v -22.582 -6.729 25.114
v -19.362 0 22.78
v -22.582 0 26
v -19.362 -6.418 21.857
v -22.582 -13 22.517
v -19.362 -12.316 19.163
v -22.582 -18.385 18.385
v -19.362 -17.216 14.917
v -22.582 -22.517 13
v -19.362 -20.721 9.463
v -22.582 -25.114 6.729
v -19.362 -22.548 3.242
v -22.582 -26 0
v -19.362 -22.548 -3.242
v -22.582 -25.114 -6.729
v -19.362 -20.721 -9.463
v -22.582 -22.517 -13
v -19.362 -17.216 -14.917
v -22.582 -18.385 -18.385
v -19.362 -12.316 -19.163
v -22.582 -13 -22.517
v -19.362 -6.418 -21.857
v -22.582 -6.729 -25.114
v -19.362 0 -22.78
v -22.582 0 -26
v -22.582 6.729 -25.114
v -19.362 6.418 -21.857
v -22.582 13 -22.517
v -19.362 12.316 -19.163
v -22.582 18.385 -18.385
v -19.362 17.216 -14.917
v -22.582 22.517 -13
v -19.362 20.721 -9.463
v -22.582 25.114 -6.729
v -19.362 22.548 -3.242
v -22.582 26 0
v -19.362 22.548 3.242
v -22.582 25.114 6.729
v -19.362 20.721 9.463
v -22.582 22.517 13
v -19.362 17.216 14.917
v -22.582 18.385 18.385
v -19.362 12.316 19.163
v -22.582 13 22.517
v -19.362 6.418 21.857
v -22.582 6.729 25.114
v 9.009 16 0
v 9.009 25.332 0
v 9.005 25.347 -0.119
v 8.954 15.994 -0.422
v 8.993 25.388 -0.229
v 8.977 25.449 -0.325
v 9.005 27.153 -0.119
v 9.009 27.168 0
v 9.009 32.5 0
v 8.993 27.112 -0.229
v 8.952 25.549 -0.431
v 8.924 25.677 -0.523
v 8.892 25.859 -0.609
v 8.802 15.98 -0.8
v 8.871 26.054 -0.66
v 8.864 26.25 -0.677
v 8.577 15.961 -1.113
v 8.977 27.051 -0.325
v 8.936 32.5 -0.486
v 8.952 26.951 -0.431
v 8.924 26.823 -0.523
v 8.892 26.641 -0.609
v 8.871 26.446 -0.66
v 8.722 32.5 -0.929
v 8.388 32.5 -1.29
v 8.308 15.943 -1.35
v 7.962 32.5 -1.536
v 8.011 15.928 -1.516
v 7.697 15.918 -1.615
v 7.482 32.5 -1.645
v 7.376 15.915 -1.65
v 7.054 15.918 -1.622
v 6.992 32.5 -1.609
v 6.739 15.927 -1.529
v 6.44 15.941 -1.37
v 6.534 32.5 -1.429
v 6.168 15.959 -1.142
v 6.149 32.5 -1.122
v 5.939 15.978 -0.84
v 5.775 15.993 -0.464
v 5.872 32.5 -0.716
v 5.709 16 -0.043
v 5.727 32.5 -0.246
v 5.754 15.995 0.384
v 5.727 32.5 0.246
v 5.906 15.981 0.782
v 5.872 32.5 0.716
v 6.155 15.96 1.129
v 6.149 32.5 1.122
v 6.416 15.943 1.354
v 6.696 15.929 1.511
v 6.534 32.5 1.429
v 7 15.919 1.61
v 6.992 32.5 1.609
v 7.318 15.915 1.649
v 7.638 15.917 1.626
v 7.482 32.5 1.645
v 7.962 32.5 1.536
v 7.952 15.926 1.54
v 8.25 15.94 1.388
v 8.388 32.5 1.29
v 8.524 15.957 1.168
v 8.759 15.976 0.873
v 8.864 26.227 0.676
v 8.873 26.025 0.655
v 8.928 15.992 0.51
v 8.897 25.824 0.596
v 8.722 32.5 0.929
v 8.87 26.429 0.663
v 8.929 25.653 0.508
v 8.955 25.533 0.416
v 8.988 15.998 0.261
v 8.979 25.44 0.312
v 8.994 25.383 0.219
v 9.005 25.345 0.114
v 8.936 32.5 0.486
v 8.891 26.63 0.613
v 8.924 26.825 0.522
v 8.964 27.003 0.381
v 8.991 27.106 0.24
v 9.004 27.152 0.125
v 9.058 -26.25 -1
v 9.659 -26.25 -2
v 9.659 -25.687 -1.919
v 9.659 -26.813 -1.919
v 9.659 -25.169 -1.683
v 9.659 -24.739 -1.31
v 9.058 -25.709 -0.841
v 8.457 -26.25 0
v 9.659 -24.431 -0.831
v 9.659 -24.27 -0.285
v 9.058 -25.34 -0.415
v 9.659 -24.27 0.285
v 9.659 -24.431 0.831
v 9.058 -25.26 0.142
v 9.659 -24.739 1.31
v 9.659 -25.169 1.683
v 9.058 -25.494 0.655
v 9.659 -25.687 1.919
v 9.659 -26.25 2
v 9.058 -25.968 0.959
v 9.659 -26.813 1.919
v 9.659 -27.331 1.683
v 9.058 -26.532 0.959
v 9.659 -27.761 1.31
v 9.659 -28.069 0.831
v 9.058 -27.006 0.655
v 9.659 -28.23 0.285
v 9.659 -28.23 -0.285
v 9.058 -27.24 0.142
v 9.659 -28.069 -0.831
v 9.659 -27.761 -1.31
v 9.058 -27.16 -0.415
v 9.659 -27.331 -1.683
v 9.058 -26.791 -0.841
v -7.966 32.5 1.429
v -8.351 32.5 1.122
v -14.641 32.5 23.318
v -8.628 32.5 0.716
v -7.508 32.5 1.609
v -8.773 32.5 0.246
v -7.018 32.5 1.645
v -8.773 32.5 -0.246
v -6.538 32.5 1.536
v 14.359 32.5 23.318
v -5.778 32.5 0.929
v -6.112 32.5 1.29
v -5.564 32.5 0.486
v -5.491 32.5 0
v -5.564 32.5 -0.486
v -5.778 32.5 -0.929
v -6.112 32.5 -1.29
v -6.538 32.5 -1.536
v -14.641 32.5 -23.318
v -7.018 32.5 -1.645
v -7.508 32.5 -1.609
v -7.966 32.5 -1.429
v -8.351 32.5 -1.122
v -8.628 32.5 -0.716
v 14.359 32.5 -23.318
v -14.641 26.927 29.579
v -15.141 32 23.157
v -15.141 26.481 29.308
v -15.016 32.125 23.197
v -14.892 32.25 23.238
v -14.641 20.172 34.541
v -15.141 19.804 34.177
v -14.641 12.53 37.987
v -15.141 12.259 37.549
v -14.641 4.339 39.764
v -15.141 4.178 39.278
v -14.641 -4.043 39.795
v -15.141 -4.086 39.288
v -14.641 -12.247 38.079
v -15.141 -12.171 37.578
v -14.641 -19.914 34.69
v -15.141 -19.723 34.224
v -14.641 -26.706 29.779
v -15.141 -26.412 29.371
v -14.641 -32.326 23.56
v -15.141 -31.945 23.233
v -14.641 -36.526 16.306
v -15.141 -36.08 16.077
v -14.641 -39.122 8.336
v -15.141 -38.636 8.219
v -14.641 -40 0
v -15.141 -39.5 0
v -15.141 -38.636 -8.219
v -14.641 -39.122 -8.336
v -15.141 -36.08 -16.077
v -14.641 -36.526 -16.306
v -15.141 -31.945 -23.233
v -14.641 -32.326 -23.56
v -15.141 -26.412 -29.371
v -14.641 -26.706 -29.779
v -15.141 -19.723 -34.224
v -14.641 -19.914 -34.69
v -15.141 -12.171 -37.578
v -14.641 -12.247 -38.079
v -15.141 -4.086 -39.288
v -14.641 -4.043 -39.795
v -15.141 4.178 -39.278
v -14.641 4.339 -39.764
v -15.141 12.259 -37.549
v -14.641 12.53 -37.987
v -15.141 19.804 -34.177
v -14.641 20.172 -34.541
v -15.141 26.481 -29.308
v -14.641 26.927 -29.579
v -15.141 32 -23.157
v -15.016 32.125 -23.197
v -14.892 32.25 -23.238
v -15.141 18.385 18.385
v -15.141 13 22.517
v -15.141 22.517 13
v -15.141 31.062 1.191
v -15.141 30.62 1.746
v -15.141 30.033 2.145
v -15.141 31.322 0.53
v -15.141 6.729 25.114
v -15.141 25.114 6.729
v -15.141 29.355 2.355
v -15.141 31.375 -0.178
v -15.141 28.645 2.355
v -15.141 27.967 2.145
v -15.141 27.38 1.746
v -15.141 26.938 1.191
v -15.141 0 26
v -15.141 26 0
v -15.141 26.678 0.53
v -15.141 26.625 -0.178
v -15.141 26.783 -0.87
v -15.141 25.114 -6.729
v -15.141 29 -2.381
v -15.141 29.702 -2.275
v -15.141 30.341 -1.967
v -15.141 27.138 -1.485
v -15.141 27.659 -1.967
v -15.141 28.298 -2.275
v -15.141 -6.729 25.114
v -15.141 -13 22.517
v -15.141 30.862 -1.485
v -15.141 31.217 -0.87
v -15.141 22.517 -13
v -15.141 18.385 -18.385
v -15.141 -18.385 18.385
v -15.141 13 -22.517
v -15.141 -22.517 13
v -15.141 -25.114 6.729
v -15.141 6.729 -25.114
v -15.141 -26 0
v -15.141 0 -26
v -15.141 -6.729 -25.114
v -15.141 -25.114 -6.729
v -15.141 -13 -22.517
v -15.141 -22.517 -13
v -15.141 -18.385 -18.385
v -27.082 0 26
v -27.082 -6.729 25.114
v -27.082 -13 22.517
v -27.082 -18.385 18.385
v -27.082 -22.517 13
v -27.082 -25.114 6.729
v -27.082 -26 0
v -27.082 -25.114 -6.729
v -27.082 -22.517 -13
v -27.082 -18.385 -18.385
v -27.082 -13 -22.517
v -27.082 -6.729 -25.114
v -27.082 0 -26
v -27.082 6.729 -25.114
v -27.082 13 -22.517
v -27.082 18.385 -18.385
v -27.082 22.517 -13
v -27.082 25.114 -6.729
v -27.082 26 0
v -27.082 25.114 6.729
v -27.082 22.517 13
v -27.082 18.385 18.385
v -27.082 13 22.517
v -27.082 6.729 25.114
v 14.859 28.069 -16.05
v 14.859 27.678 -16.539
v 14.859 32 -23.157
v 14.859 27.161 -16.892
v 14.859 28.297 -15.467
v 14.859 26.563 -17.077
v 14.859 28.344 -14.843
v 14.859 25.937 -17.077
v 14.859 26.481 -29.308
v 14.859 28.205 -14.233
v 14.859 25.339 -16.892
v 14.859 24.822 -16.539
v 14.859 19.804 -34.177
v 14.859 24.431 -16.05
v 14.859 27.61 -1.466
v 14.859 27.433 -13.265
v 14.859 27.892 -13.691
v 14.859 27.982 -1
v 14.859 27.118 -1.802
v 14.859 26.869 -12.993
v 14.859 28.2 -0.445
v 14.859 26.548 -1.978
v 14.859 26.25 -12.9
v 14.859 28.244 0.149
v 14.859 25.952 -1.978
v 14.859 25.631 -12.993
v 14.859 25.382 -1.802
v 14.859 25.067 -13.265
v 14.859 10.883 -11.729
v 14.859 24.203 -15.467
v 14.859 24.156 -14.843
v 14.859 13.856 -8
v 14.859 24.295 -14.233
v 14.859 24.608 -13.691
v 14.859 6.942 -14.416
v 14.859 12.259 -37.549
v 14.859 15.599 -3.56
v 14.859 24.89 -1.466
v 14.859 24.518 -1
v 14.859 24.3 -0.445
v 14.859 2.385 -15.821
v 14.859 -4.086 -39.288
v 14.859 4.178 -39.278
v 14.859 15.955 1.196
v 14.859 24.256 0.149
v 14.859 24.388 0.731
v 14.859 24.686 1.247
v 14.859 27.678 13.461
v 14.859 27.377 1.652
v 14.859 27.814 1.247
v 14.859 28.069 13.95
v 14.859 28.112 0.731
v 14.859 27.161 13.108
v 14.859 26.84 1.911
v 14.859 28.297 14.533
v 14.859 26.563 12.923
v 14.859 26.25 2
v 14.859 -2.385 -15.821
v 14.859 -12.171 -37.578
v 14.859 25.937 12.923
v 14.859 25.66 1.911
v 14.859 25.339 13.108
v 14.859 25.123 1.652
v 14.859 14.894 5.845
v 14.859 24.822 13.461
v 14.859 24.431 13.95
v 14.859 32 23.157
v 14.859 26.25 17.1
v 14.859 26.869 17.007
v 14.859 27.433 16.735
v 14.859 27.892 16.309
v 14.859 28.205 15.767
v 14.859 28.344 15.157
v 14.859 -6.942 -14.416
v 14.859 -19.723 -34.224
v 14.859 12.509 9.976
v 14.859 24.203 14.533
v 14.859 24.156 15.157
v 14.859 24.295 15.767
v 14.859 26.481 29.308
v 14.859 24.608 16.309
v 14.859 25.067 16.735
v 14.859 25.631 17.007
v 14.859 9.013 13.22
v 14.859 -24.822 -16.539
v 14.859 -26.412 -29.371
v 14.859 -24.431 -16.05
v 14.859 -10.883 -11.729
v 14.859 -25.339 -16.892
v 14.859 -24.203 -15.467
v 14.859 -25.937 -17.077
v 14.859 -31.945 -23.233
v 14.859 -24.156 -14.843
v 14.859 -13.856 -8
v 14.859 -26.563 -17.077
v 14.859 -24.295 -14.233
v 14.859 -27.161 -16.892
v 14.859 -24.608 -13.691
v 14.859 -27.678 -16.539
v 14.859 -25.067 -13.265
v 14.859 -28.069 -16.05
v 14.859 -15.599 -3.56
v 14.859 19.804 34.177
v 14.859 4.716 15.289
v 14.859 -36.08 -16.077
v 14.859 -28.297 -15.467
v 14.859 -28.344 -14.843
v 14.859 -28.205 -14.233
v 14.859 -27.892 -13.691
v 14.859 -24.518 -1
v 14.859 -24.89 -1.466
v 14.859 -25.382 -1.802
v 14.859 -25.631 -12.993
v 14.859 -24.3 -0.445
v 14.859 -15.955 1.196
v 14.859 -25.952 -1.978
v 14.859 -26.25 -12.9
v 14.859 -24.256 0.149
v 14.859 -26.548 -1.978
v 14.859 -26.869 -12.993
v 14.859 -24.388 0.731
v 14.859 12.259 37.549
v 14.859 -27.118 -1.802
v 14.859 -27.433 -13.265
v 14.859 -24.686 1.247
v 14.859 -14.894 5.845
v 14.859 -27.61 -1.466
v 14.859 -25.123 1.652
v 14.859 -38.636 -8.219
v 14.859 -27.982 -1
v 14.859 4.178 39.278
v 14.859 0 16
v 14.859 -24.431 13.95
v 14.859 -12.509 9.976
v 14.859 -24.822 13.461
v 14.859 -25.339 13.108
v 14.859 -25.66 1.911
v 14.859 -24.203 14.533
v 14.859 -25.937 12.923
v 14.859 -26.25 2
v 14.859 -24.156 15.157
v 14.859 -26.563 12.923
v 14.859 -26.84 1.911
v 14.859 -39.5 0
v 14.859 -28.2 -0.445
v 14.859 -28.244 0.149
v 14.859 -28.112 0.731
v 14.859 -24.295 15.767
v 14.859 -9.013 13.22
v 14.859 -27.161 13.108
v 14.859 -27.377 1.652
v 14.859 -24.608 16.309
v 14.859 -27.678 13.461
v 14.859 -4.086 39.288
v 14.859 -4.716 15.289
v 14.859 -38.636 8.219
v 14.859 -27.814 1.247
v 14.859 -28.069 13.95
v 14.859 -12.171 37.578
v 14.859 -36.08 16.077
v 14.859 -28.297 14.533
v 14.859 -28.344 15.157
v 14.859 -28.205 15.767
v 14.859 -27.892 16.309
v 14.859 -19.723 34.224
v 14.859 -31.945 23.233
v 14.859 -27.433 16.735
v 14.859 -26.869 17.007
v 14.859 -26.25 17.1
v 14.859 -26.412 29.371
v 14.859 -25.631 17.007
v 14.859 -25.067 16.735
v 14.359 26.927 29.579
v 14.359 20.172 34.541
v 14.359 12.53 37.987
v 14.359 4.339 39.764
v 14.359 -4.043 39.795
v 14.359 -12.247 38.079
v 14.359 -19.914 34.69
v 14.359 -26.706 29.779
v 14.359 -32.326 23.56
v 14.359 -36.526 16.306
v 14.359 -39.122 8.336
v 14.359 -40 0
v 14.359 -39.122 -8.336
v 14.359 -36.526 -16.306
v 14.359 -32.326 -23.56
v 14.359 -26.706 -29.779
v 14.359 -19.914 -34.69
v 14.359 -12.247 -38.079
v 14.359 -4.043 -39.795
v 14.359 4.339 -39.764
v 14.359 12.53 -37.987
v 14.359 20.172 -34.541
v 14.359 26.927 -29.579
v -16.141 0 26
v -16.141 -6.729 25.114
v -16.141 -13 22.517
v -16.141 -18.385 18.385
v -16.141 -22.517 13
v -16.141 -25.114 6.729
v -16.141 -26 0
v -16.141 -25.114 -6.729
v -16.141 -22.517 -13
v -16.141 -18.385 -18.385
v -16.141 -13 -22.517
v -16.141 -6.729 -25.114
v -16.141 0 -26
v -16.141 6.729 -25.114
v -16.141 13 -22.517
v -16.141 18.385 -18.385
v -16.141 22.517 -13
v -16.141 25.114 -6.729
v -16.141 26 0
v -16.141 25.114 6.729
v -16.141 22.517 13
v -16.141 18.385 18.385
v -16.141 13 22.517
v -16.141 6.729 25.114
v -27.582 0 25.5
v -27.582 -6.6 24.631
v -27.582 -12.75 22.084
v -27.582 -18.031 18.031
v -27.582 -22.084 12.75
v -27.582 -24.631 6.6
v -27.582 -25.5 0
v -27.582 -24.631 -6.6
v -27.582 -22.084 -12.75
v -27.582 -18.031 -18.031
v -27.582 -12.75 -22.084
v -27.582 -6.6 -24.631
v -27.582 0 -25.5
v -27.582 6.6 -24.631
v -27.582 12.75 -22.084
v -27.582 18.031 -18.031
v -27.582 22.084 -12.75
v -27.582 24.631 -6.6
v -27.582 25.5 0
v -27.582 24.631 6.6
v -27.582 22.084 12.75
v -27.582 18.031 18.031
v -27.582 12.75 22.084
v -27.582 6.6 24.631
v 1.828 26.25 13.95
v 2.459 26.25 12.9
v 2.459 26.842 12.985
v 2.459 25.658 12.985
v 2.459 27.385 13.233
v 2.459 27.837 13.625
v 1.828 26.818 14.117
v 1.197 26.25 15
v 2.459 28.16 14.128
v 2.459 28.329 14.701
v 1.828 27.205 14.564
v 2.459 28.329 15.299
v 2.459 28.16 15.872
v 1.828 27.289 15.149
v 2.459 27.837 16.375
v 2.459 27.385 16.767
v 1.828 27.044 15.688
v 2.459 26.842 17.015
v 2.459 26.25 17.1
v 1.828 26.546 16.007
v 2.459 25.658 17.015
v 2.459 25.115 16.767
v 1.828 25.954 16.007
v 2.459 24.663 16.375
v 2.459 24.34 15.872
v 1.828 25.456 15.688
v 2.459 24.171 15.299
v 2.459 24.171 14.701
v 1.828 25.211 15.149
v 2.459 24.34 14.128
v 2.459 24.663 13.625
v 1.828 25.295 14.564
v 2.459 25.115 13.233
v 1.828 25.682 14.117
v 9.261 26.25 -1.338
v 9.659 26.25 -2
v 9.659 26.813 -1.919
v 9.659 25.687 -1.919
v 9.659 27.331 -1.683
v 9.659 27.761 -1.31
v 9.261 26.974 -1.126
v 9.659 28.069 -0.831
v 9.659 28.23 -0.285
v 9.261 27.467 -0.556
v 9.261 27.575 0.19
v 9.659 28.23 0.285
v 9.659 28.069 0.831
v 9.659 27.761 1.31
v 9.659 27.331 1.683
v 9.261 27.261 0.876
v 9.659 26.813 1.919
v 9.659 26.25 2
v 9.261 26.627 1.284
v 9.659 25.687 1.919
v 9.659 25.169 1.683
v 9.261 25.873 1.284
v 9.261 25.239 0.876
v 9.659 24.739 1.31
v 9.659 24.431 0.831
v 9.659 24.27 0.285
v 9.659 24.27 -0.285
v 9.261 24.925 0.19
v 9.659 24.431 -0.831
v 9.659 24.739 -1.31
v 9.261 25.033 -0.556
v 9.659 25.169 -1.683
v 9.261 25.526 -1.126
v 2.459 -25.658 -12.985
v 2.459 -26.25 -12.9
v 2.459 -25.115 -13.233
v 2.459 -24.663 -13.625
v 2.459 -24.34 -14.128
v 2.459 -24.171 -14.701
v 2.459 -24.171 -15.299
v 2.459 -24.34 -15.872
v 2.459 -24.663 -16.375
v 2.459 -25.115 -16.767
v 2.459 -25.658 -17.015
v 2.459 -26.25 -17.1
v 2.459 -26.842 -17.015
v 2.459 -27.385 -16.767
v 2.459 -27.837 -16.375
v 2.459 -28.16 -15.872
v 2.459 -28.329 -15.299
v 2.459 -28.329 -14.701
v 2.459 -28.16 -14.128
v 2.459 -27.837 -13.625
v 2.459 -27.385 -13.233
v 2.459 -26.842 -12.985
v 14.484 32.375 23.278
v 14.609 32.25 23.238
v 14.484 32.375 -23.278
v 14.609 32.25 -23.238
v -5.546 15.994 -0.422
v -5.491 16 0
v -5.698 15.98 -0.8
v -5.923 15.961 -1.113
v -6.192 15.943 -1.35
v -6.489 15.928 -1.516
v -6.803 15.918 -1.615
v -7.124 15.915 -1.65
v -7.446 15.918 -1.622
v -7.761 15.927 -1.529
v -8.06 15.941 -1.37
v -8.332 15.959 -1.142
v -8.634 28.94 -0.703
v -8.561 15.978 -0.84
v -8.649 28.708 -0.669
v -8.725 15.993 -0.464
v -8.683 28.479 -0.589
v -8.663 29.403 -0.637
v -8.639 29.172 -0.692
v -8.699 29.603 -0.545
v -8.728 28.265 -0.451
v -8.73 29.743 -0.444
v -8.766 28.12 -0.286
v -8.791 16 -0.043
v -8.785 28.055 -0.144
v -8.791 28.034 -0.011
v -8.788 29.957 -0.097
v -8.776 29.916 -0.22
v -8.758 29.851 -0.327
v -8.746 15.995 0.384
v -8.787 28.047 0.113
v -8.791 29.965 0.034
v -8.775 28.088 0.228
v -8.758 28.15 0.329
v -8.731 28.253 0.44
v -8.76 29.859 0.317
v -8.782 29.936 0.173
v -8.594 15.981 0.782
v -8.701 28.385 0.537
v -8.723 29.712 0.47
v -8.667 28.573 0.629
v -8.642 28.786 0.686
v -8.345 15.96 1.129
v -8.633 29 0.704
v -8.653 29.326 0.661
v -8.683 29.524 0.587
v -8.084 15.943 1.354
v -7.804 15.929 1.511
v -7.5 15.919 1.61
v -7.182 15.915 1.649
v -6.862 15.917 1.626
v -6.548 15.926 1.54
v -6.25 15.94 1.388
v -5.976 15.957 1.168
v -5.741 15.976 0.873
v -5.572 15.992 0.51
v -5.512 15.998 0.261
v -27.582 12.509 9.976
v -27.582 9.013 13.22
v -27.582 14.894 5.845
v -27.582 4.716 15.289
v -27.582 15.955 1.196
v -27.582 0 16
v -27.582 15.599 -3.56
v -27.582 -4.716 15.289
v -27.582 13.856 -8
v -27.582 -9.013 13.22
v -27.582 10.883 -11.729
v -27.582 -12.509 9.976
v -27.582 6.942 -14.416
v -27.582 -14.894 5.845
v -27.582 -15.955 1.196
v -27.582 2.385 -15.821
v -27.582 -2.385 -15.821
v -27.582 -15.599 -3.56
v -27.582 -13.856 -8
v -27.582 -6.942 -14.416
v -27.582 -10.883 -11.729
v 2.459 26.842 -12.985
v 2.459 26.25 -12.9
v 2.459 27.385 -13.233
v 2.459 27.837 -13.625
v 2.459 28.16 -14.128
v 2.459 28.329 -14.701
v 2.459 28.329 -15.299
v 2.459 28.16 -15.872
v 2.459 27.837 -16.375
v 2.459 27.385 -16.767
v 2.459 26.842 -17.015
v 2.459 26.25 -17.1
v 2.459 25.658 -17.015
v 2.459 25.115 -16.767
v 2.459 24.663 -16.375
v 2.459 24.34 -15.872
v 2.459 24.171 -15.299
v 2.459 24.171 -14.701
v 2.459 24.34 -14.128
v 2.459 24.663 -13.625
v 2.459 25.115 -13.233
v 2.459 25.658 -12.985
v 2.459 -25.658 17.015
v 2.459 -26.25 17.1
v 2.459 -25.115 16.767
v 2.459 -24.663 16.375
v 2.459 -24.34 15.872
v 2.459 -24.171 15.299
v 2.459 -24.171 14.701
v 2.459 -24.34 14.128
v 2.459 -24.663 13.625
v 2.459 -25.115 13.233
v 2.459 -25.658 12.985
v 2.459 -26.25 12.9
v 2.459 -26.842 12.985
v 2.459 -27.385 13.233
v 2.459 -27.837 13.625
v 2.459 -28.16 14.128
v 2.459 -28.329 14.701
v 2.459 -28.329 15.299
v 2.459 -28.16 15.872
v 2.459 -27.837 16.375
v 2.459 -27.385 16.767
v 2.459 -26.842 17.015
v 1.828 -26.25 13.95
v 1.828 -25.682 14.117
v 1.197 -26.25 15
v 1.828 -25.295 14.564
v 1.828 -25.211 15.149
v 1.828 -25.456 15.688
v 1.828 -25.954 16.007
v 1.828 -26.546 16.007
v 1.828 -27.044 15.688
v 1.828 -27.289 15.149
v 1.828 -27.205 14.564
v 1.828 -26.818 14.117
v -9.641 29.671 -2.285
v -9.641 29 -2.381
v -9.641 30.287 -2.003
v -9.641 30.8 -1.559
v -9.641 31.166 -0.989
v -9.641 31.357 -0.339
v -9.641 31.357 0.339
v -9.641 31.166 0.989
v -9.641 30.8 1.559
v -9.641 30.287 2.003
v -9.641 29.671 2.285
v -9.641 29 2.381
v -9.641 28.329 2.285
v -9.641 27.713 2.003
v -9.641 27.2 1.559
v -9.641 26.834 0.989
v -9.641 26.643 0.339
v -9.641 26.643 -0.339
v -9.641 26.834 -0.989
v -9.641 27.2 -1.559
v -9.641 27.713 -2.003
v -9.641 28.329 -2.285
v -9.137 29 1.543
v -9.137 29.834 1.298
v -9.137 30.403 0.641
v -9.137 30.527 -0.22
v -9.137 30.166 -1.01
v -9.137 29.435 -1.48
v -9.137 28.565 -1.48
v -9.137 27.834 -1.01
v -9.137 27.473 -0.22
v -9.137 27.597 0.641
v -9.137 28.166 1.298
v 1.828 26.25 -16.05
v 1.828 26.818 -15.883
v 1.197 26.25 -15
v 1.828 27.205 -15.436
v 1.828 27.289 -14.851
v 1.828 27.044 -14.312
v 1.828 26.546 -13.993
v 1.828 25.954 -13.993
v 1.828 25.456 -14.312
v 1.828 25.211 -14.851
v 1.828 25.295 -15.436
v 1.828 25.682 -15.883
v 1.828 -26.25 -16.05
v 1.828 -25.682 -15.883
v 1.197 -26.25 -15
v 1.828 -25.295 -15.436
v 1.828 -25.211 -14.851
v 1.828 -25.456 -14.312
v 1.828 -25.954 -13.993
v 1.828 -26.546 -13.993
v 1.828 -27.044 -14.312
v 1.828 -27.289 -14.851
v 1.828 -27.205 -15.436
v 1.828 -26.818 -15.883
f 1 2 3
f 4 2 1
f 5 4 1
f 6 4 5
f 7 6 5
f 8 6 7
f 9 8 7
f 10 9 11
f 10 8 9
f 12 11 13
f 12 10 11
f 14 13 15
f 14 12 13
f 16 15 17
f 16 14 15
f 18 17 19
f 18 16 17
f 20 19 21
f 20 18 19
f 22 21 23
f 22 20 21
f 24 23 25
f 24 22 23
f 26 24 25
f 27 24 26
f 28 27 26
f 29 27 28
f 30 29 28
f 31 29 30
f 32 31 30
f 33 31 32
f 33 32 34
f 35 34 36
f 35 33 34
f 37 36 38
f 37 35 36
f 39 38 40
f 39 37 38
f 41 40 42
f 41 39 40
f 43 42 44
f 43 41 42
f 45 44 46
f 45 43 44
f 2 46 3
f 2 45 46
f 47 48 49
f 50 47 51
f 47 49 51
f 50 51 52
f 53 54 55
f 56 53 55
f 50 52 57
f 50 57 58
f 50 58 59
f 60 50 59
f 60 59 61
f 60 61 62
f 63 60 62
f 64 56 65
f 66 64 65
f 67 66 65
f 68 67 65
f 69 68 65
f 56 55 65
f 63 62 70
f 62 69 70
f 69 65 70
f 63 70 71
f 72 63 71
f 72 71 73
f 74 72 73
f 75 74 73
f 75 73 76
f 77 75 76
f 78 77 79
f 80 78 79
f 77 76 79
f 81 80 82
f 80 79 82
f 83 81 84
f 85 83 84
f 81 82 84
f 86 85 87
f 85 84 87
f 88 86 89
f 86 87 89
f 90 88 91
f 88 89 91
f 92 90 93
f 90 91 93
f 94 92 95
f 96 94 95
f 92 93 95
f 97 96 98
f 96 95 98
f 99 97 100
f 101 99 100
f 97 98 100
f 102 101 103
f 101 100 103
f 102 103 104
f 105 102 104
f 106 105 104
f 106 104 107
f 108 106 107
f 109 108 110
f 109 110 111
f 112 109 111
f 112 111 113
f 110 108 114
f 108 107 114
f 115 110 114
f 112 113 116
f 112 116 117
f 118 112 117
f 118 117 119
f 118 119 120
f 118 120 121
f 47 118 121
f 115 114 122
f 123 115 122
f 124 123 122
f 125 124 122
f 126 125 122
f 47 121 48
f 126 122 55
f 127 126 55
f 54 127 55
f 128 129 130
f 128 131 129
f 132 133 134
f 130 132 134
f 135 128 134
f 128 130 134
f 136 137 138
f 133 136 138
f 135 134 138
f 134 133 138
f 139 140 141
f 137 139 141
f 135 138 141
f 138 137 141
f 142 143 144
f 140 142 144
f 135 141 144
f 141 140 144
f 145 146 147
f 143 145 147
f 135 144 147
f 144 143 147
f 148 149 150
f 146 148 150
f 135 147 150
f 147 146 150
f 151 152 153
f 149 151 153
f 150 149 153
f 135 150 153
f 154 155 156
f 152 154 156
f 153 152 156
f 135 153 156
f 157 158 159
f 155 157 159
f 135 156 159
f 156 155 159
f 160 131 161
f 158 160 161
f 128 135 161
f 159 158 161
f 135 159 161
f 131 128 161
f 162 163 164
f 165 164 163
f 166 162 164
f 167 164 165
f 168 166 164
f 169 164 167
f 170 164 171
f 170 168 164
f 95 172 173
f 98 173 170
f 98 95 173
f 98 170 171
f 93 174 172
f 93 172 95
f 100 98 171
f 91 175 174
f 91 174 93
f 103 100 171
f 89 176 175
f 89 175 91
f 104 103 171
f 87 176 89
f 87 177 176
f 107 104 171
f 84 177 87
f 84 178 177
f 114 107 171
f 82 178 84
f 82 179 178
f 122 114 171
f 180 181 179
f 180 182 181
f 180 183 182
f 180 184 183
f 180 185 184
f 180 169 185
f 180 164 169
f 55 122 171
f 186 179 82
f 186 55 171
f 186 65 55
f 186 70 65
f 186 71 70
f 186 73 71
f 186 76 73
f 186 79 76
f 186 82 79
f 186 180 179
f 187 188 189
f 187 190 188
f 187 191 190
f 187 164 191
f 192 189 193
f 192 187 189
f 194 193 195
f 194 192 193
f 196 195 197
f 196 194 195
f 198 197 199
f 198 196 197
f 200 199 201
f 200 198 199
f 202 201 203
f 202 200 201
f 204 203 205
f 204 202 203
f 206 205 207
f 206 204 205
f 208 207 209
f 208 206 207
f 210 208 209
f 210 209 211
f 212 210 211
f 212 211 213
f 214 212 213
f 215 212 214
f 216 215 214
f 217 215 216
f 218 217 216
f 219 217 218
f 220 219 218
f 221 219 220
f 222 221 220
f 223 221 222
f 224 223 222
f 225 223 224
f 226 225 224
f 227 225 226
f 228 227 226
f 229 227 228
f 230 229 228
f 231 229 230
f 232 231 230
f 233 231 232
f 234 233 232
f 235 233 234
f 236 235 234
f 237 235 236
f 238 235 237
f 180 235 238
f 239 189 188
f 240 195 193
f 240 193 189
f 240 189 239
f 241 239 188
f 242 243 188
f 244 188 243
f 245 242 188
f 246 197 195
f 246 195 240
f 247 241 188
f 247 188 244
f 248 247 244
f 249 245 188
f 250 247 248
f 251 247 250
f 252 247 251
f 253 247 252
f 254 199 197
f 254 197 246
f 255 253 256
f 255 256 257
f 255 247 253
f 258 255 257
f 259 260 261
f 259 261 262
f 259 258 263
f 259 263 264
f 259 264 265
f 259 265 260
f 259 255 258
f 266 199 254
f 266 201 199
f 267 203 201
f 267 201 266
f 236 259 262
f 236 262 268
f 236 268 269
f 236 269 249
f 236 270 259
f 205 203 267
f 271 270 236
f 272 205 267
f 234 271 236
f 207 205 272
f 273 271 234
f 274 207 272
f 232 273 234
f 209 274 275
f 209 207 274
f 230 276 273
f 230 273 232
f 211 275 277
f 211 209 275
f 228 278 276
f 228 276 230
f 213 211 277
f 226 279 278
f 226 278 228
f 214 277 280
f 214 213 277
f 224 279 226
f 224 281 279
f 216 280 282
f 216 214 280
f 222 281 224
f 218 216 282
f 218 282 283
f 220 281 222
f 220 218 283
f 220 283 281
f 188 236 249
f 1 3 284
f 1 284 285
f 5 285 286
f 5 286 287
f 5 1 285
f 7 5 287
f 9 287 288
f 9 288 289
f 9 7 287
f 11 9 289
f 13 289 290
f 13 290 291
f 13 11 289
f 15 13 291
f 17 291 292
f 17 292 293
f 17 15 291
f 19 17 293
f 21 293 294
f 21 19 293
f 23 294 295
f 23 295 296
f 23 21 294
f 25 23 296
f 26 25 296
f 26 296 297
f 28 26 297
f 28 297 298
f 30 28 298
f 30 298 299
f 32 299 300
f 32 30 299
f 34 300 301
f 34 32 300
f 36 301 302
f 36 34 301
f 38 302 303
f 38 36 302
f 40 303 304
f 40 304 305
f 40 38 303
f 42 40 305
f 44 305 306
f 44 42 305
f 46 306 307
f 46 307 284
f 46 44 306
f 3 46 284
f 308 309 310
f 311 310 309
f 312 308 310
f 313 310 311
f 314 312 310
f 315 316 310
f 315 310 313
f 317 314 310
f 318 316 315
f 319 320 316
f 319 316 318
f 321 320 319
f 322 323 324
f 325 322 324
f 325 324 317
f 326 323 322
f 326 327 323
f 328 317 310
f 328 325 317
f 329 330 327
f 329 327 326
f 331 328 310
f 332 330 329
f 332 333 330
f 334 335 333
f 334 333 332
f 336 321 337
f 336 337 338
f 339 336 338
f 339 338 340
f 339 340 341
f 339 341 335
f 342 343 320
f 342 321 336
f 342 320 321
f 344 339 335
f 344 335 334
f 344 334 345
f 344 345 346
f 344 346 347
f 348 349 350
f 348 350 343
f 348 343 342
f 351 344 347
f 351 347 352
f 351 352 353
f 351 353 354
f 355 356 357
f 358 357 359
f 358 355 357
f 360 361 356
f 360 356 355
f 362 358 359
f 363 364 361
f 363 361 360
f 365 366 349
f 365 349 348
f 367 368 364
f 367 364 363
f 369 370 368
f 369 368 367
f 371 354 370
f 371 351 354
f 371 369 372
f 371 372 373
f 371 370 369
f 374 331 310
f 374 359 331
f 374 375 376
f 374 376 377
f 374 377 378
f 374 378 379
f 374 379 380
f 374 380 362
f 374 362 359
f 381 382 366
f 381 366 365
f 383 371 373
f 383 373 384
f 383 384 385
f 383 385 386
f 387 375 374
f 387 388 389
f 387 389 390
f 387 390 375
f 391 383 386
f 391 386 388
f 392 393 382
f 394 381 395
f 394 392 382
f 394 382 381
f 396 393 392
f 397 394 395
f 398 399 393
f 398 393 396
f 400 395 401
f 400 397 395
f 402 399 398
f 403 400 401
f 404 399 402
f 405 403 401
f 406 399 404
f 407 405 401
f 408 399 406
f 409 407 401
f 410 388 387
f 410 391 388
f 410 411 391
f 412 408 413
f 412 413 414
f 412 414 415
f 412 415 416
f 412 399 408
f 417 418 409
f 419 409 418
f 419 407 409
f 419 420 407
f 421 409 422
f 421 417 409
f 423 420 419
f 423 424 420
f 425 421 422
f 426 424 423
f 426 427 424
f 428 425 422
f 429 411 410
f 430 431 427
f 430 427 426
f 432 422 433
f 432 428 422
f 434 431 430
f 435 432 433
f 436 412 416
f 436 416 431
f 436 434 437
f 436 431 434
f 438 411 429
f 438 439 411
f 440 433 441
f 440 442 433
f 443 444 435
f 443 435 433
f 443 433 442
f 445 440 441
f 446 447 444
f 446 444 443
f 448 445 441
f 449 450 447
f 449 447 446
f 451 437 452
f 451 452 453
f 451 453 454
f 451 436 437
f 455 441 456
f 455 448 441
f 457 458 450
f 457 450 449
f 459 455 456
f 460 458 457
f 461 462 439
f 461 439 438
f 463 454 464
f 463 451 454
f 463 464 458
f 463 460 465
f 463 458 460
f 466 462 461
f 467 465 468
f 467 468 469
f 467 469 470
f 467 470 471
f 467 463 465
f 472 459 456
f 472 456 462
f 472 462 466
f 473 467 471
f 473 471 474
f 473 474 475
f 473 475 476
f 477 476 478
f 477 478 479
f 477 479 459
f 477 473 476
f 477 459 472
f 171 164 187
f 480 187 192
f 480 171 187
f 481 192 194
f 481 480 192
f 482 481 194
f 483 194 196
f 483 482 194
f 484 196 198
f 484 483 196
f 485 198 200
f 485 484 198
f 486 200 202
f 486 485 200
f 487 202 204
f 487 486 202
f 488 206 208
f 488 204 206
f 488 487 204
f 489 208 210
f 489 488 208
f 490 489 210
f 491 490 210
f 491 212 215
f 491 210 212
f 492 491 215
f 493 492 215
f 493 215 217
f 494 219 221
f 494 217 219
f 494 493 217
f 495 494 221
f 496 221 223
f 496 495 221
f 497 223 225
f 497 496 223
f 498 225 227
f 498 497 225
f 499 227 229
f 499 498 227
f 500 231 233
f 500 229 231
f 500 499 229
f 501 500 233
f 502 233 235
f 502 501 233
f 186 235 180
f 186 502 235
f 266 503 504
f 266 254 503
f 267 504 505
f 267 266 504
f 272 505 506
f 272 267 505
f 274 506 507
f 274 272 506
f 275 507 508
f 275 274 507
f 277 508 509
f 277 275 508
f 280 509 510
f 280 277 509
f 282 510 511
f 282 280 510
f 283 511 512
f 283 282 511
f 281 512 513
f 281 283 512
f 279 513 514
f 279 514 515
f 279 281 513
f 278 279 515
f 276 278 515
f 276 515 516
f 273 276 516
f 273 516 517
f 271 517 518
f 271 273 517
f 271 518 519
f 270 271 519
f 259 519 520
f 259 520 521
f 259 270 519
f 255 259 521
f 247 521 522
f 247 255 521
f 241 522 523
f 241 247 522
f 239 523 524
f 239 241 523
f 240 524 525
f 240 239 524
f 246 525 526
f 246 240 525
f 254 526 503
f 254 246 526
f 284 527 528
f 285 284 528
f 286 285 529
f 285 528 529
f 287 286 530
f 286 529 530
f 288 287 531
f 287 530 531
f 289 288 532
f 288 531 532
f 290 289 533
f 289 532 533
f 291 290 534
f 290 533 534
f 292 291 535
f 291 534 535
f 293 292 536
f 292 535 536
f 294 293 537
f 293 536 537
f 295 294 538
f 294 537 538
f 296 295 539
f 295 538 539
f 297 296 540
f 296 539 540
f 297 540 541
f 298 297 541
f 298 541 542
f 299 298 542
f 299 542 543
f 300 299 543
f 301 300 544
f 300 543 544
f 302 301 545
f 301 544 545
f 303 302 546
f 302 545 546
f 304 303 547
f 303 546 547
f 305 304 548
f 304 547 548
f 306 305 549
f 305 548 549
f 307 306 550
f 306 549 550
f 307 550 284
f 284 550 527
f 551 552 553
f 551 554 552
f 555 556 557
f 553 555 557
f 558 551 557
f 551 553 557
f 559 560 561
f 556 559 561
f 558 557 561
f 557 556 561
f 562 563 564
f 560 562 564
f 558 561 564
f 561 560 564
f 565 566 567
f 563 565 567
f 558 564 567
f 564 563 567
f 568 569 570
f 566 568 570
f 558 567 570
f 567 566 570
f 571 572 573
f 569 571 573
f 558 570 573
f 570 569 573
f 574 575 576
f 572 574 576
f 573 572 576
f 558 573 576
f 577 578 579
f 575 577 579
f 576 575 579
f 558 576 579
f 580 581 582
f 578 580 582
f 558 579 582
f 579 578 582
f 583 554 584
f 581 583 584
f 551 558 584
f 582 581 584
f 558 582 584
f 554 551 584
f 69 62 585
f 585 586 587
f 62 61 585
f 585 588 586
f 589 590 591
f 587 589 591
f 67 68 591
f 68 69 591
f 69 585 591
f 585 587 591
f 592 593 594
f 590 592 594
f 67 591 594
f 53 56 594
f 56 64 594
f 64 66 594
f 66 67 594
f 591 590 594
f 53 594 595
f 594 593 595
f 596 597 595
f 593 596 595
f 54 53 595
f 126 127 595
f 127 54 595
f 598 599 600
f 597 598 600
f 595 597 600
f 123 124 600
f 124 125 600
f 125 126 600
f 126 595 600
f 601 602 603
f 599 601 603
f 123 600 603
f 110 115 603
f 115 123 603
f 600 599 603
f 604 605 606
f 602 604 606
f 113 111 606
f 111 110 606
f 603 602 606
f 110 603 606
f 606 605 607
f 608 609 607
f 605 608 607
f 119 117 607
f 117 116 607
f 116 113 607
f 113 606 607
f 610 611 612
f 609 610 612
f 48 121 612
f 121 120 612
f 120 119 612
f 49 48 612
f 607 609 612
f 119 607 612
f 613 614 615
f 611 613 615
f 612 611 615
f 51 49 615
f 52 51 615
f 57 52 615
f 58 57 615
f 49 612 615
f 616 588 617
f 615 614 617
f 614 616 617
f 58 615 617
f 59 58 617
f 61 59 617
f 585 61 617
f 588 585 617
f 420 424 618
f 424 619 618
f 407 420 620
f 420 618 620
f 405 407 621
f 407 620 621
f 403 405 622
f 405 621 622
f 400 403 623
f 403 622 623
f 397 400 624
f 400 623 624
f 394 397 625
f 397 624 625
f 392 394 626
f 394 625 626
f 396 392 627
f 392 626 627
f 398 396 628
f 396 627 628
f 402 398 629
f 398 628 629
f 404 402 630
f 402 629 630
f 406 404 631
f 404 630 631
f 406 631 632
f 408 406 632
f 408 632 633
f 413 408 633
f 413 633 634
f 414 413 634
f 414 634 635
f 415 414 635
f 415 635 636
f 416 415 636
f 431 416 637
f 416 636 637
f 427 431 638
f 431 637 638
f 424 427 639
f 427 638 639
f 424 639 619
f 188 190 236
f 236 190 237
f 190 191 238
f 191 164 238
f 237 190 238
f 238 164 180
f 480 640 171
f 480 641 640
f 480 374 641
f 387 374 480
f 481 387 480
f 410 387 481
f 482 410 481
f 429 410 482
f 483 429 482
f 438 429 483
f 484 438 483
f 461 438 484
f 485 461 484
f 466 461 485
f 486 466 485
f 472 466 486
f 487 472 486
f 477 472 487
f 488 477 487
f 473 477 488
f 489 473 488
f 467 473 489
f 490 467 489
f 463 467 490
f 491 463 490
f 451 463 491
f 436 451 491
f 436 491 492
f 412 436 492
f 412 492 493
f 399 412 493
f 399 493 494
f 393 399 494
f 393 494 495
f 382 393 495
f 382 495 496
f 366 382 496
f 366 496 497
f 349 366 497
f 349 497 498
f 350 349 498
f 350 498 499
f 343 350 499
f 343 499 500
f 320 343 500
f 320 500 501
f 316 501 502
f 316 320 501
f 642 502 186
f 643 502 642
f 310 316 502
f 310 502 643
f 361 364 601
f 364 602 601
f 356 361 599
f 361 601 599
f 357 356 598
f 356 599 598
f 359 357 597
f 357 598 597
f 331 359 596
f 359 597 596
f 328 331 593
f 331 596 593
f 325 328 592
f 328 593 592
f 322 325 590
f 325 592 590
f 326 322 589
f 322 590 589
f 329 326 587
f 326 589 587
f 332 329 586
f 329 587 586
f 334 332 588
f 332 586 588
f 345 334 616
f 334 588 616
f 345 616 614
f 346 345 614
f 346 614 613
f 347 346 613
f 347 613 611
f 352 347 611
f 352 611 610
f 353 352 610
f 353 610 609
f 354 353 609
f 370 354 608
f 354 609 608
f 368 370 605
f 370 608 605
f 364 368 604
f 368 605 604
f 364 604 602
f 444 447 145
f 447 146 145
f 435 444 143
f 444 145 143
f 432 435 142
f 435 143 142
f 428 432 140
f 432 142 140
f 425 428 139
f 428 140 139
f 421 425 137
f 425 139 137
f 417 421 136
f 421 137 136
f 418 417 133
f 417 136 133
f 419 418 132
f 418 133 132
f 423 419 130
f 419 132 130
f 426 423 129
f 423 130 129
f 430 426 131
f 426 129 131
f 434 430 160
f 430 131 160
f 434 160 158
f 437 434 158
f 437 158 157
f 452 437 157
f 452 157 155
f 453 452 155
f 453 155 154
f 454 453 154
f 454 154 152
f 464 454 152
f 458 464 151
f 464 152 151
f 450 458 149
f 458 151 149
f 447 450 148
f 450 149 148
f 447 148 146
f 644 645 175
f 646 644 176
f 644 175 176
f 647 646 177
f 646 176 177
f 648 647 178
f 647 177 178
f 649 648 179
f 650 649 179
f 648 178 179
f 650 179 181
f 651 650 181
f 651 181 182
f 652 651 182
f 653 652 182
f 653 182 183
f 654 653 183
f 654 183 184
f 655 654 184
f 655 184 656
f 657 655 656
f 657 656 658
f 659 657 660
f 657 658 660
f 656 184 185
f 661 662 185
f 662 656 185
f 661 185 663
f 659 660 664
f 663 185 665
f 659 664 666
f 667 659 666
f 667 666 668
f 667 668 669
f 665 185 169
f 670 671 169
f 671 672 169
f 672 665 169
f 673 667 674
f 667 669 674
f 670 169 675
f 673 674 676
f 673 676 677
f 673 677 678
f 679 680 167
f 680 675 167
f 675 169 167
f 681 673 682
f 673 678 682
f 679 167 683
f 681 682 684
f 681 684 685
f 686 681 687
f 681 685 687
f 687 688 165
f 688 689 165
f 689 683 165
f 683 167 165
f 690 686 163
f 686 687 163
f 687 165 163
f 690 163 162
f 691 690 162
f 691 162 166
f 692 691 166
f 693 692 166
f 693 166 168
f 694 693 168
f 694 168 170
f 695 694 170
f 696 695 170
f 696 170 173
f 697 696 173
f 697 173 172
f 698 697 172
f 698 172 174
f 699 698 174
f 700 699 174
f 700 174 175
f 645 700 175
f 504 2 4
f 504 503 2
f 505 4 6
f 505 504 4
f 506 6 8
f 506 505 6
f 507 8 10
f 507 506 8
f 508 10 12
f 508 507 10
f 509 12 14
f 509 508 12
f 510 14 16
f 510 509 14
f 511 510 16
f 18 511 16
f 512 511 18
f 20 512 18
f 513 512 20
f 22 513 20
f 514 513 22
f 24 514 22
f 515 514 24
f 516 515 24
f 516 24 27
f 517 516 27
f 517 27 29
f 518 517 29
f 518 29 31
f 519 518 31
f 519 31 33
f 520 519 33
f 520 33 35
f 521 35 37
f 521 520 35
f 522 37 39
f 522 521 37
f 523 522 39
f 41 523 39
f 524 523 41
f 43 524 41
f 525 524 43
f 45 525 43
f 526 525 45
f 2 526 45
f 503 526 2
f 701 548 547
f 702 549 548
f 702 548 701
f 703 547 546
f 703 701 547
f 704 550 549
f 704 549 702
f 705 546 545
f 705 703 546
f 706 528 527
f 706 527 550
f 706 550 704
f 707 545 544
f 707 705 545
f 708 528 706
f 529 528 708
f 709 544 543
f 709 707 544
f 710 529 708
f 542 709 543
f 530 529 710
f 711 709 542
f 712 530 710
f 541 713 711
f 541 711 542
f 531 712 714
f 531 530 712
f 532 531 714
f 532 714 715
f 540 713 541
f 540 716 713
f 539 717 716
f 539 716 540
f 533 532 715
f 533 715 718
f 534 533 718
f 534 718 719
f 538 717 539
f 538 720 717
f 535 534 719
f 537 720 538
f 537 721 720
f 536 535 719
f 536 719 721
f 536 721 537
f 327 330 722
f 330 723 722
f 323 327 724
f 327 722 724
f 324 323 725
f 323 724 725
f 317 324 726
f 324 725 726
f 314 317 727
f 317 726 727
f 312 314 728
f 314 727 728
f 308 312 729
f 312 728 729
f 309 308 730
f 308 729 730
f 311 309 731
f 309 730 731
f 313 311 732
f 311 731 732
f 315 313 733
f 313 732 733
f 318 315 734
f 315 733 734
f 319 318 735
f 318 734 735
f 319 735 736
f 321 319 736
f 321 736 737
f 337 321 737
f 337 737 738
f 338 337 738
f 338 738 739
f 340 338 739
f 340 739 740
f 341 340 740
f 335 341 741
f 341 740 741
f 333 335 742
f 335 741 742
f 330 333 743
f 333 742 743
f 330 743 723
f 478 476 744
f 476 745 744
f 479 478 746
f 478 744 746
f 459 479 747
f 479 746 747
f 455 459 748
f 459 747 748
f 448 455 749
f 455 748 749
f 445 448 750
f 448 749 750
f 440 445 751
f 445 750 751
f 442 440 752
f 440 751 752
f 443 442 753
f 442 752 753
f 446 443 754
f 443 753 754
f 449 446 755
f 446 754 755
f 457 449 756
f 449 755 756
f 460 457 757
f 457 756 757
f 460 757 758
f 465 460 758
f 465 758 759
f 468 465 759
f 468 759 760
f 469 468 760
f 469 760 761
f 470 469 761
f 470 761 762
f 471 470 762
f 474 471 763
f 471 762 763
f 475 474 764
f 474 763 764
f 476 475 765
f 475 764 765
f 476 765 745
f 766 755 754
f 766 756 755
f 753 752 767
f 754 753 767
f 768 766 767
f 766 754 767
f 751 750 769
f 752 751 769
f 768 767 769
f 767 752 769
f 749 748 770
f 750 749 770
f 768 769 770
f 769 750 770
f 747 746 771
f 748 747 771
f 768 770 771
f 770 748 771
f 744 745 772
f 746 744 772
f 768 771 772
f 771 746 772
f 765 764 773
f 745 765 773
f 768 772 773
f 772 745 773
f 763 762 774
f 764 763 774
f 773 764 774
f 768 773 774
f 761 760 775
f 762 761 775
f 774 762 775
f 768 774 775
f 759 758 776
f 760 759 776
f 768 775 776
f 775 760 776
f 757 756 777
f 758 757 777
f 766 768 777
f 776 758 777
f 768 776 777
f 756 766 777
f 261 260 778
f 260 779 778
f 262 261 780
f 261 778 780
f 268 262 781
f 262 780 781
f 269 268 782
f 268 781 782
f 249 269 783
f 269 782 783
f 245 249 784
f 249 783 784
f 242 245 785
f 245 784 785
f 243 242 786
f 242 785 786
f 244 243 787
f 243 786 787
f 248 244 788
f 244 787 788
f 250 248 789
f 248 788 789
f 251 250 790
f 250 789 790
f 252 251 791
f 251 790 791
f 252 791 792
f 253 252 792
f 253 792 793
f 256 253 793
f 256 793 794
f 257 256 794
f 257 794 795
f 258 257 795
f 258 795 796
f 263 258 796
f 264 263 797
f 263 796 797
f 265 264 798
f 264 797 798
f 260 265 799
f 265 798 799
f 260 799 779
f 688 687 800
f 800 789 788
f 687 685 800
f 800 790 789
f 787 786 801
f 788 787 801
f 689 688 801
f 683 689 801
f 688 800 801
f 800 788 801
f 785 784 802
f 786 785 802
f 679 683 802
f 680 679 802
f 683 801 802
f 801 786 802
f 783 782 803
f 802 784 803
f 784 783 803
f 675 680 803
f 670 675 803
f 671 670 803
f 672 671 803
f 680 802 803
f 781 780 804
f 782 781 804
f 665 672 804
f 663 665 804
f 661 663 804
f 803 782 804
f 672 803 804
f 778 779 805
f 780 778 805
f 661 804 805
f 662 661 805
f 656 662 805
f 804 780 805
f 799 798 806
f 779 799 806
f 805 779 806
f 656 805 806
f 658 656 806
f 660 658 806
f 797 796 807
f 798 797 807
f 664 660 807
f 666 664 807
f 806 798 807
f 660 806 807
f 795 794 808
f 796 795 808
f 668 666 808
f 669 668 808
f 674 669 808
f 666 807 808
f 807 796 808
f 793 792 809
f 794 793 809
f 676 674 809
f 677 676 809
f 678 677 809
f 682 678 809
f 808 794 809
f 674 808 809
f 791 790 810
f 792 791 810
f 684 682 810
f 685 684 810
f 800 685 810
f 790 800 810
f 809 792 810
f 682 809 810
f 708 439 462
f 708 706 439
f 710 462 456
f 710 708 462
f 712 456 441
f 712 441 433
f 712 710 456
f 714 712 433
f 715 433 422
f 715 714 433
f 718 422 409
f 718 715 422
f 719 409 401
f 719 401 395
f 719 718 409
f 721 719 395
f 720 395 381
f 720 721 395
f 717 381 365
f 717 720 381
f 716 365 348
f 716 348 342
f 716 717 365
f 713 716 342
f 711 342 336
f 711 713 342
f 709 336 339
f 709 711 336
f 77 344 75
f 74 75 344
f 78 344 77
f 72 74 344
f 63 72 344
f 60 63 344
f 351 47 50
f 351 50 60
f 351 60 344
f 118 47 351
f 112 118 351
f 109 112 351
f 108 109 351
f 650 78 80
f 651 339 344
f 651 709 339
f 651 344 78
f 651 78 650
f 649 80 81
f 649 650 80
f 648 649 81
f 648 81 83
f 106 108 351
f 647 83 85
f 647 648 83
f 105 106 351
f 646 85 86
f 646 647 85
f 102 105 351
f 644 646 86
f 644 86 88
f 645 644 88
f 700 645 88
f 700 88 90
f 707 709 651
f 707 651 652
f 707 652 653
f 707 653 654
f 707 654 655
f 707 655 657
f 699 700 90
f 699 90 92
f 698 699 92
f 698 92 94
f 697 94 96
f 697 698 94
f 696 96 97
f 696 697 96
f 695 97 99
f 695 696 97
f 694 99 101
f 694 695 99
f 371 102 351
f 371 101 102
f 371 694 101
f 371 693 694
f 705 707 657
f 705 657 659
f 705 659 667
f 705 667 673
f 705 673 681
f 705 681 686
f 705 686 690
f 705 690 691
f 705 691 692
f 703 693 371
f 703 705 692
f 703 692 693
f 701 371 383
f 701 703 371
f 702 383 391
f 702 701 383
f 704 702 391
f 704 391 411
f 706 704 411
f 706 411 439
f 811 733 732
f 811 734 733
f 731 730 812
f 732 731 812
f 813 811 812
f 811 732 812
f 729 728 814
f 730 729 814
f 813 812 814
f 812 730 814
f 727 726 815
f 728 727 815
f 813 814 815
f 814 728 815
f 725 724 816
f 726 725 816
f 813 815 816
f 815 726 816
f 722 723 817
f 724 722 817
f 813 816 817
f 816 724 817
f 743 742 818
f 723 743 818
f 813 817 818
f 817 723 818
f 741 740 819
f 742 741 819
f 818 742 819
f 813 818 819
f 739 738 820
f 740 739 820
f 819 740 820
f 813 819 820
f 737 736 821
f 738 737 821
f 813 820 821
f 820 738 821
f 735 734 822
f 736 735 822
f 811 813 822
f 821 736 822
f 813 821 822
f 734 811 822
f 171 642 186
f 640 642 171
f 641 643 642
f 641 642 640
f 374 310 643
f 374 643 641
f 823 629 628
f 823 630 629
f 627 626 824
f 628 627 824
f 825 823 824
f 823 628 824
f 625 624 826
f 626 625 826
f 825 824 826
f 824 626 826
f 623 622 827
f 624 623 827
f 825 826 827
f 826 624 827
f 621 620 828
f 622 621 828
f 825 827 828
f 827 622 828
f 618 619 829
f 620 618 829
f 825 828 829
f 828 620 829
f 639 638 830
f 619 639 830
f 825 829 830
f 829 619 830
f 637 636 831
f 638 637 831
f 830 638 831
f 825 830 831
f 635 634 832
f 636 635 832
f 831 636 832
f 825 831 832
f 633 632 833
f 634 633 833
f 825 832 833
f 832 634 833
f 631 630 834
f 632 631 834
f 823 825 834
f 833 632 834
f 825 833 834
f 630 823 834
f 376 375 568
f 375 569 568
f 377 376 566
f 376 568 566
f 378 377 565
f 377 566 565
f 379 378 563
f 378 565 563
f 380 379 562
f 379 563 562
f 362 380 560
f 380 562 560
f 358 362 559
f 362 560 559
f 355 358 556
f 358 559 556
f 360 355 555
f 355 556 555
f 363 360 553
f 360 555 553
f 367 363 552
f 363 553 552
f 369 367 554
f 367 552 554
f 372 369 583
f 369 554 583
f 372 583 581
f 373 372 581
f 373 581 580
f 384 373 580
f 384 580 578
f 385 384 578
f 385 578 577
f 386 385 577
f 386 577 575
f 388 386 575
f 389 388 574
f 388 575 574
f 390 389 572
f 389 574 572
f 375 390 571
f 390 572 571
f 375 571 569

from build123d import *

# Parameters (mm, degrees)
CHAMFER1_SIZE                   = 0.5
SKETCH3_W                       = 30.914832272
SKETCH3_H                       = 82.011072724
CUT_EXTRUDE2_DEPTH              = 7.5
CHAMFER2_SIZE                   = 0.5
F_3_16_0_1875_DOWEL_HOLE1_D     = 4.7625
F_3_16_0_1875_DOWEL_HOLE1_DEPTH = 5.5
F_3_16_0_1875_DOWEL_HOLE1_TIP   = 1.430799349
M5X0_8_TAPPED_HOLE1_D           = 4.2
M5X0_8_TAPPED_HOLE1_DEPTH       = 12.4
M5X0_8_TAPPED_HOLE1_TIP         = 1.2618073
F_4_0MM_DOWEL_HOLE1_D           = 4
F_4_0MM_DOWEL_HOLE1_DEPTH       = 5.2
F_4_0MM_DOWEL_HOLE1_TIP         = 1.201721238
M4X0_7_TAPPED_HOLE1_REACH       = 89.275
M4X0_7_TAPPED_HOLE1_BORE_R      = 1.65


with BuildPart() as part:
    # Sketch1 → Revolve1 (revolve)
    with BuildSketch(Plane.XY, mode=Mode.PRIVATE) as revolve1_sk:
        Polygon((-27.58192079, 26), (-22.58192079, 26), (-19.361510024, 22.779589234), (-16.141099258, 26), (-15.141099258, 26), (-15.141099258, 40), (14.858900742, 40), (14.858900742, 16), (-27.58192079, 16), align=None)
    revolve(revolve1_sk.sketch.rotate(Axis((-39.738562092, 0, 0), (1, 0, 0)), 90), axis=Axis((-39.738562092, 0, 0), (1, 0, 0)))

    # Chamfer1
    chamfer1_edges = [part.edges().sort_by_distance(p)[0] for p in [
        (-27.58192079, 0, -26),
        (14.858900742, 0, -40),
        (-15.141099258, 0, -40),
    ]]
    chamfer(chamfer1_edges, length=CHAMFER1_SIZE)

    # Sketch3 → Cut-Extrude2 (cut)
    with BuildSketch(Plane(origin=(0, 40, 0), x_dir=(1, 0, 0), z_dir=(0, 1, 0))):
        with Locations((-0.069893973, 0.224952002)):
            Rectangle(SKETCH3_W, SKETCH3_H)
    extrude(amount=-CUT_EXTRUDE2_DEPTH, mode=Mode.SUBTRACT)

    # Chamfer2
    chamfer2_edges = [part.edges().sort_by_distance(p)[0] for p in [
        (14.858900742, 32.5, 0),
        (-15.141099258, 32.5, 0),
    ]]
    chamfer(chamfer2_edges, length=CHAMFER2_SIZE)

    # 3/16 (0.1875) Dowel Hole1
    with Locations(Plane.ZY.offset(15.141099258)):
        with Locations((0, 29)):
            Hole(F_3_16_0_1875_DOWEL_HOLE1_D / 2, depth=F_3_16_0_1875_DOWEL_HOLE1_DEPTH)
            with Locations((0, 0, -(F_3_16_0_1875_DOWEL_HOLE1_DEPTH + F_3_16_0_1875_DOWEL_HOLE1_TIP / 2))):  # 118° drill point
                Cone(0, F_3_16_0_1875_DOWEL_HOLE1_D / 2, F_3_16_0_1875_DOWEL_HOLE1_TIP, mode=Mode.SUBTRACT)

    # M5x0.8 Tapped Hole1
    with Locations(Plane(origin=(14.858900742, 0, 0), x_dir=(0, 0, -1), z_dir=(1, 0, 0))):
        with Locations((-15, 26.25), (15, 26.25), (-15, -26.25), (15, -26.25)):
            Hole(M5X0_8_TAPPED_HOLE1_D / 2, depth=M5X0_8_TAPPED_HOLE1_DEPTH)
            with Locations((0, 0, -(M5X0_8_TAPPED_HOLE1_DEPTH + M5X0_8_TAPPED_HOLE1_TIP / 2))):  # 118° drill point
                Cone(0, M5X0_8_TAPPED_HOLE1_D / 2, M5X0_8_TAPPED_HOLE1_TIP, mode=Mode.SUBTRACT)

    # Ø4.0mm Dowel Hole1
    with Locations(Plane(origin=(14.858900742, 0, 0), x_dir=(0, 0, -1), z_dir=(1, 0, 0))):
        with Locations((0, 26.25), (0, -26.25)):
            Hole(F_4_0MM_DOWEL_HOLE1_D / 2, depth=F_4_0MM_DOWEL_HOLE1_DEPTH)
            with Locations((0, 0, -(F_4_0MM_DOWEL_HOLE1_DEPTH + F_4_0MM_DOWEL_HOLE1_TIP / 2))):  # 118° drill point
                Cone(0, F_4_0MM_DOWEL_HOLE1_D / 2, F_4_0MM_DOWEL_HOLE1_TIP, mode=Mode.SUBTRACT)

    # M4x0.7 Tapped Hole1 bore → M4x0.7 Tapped Hole1 (cut, up to next)
    with BuildSketch(Plane(origin=(0, 32.5, 0), x_dir=(1, 0, 0), z_dir=(0, 1, 0)), mode=Mode.PRIVATE) as m4x0_7_tapped_hole1_sk1:
        with Locations((-7.141099258, 0)):
            Circle(M4X0_7_TAPPED_HOLE1_BORE_R)
    m4x0_7_tapped_hole1_tool1 = extrude(m4x0_7_tapped_hole1_sk1.sketch, amount=-M4X0_7_TAPPED_HOLE1_REACH, mode=Mode.PRIVATE) & part.part
    # M4x0.7 Tapped Hole1 bore → M4x0.7 Tapped Hole1 (cut, up to next)
    with BuildSketch(Plane(origin=(0, 32.5, 0), x_dir=(1, 0, 0), z_dir=(0, 1, 0)), mode=Mode.PRIVATE) as m4x0_7_tapped_hole1_sk2:
        with Locations((7.358900742, 0)):
            Circle(M4X0_7_TAPPED_HOLE1_BORE_R)
    m4x0_7_tapped_hole1_tool2 = extrude(m4x0_7_tapped_hole1_sk2.sketch, amount=-M4X0_7_TAPPED_HOLE1_REACH, mode=Mode.PRIVATE) & part.part
    add(m4x0_7_tapped_hole1_tool1.solids().sort_by_distance((-7.141099, 32.5, 0))[0], mode=Mode.SUBTRACT)
    add(m4x0_7_tapped_hole1_tool2.solids().sort_by_distance((7.358901, 32.5, 0))[0], mode=Mode.SUBTRACT)


solid = part.part
